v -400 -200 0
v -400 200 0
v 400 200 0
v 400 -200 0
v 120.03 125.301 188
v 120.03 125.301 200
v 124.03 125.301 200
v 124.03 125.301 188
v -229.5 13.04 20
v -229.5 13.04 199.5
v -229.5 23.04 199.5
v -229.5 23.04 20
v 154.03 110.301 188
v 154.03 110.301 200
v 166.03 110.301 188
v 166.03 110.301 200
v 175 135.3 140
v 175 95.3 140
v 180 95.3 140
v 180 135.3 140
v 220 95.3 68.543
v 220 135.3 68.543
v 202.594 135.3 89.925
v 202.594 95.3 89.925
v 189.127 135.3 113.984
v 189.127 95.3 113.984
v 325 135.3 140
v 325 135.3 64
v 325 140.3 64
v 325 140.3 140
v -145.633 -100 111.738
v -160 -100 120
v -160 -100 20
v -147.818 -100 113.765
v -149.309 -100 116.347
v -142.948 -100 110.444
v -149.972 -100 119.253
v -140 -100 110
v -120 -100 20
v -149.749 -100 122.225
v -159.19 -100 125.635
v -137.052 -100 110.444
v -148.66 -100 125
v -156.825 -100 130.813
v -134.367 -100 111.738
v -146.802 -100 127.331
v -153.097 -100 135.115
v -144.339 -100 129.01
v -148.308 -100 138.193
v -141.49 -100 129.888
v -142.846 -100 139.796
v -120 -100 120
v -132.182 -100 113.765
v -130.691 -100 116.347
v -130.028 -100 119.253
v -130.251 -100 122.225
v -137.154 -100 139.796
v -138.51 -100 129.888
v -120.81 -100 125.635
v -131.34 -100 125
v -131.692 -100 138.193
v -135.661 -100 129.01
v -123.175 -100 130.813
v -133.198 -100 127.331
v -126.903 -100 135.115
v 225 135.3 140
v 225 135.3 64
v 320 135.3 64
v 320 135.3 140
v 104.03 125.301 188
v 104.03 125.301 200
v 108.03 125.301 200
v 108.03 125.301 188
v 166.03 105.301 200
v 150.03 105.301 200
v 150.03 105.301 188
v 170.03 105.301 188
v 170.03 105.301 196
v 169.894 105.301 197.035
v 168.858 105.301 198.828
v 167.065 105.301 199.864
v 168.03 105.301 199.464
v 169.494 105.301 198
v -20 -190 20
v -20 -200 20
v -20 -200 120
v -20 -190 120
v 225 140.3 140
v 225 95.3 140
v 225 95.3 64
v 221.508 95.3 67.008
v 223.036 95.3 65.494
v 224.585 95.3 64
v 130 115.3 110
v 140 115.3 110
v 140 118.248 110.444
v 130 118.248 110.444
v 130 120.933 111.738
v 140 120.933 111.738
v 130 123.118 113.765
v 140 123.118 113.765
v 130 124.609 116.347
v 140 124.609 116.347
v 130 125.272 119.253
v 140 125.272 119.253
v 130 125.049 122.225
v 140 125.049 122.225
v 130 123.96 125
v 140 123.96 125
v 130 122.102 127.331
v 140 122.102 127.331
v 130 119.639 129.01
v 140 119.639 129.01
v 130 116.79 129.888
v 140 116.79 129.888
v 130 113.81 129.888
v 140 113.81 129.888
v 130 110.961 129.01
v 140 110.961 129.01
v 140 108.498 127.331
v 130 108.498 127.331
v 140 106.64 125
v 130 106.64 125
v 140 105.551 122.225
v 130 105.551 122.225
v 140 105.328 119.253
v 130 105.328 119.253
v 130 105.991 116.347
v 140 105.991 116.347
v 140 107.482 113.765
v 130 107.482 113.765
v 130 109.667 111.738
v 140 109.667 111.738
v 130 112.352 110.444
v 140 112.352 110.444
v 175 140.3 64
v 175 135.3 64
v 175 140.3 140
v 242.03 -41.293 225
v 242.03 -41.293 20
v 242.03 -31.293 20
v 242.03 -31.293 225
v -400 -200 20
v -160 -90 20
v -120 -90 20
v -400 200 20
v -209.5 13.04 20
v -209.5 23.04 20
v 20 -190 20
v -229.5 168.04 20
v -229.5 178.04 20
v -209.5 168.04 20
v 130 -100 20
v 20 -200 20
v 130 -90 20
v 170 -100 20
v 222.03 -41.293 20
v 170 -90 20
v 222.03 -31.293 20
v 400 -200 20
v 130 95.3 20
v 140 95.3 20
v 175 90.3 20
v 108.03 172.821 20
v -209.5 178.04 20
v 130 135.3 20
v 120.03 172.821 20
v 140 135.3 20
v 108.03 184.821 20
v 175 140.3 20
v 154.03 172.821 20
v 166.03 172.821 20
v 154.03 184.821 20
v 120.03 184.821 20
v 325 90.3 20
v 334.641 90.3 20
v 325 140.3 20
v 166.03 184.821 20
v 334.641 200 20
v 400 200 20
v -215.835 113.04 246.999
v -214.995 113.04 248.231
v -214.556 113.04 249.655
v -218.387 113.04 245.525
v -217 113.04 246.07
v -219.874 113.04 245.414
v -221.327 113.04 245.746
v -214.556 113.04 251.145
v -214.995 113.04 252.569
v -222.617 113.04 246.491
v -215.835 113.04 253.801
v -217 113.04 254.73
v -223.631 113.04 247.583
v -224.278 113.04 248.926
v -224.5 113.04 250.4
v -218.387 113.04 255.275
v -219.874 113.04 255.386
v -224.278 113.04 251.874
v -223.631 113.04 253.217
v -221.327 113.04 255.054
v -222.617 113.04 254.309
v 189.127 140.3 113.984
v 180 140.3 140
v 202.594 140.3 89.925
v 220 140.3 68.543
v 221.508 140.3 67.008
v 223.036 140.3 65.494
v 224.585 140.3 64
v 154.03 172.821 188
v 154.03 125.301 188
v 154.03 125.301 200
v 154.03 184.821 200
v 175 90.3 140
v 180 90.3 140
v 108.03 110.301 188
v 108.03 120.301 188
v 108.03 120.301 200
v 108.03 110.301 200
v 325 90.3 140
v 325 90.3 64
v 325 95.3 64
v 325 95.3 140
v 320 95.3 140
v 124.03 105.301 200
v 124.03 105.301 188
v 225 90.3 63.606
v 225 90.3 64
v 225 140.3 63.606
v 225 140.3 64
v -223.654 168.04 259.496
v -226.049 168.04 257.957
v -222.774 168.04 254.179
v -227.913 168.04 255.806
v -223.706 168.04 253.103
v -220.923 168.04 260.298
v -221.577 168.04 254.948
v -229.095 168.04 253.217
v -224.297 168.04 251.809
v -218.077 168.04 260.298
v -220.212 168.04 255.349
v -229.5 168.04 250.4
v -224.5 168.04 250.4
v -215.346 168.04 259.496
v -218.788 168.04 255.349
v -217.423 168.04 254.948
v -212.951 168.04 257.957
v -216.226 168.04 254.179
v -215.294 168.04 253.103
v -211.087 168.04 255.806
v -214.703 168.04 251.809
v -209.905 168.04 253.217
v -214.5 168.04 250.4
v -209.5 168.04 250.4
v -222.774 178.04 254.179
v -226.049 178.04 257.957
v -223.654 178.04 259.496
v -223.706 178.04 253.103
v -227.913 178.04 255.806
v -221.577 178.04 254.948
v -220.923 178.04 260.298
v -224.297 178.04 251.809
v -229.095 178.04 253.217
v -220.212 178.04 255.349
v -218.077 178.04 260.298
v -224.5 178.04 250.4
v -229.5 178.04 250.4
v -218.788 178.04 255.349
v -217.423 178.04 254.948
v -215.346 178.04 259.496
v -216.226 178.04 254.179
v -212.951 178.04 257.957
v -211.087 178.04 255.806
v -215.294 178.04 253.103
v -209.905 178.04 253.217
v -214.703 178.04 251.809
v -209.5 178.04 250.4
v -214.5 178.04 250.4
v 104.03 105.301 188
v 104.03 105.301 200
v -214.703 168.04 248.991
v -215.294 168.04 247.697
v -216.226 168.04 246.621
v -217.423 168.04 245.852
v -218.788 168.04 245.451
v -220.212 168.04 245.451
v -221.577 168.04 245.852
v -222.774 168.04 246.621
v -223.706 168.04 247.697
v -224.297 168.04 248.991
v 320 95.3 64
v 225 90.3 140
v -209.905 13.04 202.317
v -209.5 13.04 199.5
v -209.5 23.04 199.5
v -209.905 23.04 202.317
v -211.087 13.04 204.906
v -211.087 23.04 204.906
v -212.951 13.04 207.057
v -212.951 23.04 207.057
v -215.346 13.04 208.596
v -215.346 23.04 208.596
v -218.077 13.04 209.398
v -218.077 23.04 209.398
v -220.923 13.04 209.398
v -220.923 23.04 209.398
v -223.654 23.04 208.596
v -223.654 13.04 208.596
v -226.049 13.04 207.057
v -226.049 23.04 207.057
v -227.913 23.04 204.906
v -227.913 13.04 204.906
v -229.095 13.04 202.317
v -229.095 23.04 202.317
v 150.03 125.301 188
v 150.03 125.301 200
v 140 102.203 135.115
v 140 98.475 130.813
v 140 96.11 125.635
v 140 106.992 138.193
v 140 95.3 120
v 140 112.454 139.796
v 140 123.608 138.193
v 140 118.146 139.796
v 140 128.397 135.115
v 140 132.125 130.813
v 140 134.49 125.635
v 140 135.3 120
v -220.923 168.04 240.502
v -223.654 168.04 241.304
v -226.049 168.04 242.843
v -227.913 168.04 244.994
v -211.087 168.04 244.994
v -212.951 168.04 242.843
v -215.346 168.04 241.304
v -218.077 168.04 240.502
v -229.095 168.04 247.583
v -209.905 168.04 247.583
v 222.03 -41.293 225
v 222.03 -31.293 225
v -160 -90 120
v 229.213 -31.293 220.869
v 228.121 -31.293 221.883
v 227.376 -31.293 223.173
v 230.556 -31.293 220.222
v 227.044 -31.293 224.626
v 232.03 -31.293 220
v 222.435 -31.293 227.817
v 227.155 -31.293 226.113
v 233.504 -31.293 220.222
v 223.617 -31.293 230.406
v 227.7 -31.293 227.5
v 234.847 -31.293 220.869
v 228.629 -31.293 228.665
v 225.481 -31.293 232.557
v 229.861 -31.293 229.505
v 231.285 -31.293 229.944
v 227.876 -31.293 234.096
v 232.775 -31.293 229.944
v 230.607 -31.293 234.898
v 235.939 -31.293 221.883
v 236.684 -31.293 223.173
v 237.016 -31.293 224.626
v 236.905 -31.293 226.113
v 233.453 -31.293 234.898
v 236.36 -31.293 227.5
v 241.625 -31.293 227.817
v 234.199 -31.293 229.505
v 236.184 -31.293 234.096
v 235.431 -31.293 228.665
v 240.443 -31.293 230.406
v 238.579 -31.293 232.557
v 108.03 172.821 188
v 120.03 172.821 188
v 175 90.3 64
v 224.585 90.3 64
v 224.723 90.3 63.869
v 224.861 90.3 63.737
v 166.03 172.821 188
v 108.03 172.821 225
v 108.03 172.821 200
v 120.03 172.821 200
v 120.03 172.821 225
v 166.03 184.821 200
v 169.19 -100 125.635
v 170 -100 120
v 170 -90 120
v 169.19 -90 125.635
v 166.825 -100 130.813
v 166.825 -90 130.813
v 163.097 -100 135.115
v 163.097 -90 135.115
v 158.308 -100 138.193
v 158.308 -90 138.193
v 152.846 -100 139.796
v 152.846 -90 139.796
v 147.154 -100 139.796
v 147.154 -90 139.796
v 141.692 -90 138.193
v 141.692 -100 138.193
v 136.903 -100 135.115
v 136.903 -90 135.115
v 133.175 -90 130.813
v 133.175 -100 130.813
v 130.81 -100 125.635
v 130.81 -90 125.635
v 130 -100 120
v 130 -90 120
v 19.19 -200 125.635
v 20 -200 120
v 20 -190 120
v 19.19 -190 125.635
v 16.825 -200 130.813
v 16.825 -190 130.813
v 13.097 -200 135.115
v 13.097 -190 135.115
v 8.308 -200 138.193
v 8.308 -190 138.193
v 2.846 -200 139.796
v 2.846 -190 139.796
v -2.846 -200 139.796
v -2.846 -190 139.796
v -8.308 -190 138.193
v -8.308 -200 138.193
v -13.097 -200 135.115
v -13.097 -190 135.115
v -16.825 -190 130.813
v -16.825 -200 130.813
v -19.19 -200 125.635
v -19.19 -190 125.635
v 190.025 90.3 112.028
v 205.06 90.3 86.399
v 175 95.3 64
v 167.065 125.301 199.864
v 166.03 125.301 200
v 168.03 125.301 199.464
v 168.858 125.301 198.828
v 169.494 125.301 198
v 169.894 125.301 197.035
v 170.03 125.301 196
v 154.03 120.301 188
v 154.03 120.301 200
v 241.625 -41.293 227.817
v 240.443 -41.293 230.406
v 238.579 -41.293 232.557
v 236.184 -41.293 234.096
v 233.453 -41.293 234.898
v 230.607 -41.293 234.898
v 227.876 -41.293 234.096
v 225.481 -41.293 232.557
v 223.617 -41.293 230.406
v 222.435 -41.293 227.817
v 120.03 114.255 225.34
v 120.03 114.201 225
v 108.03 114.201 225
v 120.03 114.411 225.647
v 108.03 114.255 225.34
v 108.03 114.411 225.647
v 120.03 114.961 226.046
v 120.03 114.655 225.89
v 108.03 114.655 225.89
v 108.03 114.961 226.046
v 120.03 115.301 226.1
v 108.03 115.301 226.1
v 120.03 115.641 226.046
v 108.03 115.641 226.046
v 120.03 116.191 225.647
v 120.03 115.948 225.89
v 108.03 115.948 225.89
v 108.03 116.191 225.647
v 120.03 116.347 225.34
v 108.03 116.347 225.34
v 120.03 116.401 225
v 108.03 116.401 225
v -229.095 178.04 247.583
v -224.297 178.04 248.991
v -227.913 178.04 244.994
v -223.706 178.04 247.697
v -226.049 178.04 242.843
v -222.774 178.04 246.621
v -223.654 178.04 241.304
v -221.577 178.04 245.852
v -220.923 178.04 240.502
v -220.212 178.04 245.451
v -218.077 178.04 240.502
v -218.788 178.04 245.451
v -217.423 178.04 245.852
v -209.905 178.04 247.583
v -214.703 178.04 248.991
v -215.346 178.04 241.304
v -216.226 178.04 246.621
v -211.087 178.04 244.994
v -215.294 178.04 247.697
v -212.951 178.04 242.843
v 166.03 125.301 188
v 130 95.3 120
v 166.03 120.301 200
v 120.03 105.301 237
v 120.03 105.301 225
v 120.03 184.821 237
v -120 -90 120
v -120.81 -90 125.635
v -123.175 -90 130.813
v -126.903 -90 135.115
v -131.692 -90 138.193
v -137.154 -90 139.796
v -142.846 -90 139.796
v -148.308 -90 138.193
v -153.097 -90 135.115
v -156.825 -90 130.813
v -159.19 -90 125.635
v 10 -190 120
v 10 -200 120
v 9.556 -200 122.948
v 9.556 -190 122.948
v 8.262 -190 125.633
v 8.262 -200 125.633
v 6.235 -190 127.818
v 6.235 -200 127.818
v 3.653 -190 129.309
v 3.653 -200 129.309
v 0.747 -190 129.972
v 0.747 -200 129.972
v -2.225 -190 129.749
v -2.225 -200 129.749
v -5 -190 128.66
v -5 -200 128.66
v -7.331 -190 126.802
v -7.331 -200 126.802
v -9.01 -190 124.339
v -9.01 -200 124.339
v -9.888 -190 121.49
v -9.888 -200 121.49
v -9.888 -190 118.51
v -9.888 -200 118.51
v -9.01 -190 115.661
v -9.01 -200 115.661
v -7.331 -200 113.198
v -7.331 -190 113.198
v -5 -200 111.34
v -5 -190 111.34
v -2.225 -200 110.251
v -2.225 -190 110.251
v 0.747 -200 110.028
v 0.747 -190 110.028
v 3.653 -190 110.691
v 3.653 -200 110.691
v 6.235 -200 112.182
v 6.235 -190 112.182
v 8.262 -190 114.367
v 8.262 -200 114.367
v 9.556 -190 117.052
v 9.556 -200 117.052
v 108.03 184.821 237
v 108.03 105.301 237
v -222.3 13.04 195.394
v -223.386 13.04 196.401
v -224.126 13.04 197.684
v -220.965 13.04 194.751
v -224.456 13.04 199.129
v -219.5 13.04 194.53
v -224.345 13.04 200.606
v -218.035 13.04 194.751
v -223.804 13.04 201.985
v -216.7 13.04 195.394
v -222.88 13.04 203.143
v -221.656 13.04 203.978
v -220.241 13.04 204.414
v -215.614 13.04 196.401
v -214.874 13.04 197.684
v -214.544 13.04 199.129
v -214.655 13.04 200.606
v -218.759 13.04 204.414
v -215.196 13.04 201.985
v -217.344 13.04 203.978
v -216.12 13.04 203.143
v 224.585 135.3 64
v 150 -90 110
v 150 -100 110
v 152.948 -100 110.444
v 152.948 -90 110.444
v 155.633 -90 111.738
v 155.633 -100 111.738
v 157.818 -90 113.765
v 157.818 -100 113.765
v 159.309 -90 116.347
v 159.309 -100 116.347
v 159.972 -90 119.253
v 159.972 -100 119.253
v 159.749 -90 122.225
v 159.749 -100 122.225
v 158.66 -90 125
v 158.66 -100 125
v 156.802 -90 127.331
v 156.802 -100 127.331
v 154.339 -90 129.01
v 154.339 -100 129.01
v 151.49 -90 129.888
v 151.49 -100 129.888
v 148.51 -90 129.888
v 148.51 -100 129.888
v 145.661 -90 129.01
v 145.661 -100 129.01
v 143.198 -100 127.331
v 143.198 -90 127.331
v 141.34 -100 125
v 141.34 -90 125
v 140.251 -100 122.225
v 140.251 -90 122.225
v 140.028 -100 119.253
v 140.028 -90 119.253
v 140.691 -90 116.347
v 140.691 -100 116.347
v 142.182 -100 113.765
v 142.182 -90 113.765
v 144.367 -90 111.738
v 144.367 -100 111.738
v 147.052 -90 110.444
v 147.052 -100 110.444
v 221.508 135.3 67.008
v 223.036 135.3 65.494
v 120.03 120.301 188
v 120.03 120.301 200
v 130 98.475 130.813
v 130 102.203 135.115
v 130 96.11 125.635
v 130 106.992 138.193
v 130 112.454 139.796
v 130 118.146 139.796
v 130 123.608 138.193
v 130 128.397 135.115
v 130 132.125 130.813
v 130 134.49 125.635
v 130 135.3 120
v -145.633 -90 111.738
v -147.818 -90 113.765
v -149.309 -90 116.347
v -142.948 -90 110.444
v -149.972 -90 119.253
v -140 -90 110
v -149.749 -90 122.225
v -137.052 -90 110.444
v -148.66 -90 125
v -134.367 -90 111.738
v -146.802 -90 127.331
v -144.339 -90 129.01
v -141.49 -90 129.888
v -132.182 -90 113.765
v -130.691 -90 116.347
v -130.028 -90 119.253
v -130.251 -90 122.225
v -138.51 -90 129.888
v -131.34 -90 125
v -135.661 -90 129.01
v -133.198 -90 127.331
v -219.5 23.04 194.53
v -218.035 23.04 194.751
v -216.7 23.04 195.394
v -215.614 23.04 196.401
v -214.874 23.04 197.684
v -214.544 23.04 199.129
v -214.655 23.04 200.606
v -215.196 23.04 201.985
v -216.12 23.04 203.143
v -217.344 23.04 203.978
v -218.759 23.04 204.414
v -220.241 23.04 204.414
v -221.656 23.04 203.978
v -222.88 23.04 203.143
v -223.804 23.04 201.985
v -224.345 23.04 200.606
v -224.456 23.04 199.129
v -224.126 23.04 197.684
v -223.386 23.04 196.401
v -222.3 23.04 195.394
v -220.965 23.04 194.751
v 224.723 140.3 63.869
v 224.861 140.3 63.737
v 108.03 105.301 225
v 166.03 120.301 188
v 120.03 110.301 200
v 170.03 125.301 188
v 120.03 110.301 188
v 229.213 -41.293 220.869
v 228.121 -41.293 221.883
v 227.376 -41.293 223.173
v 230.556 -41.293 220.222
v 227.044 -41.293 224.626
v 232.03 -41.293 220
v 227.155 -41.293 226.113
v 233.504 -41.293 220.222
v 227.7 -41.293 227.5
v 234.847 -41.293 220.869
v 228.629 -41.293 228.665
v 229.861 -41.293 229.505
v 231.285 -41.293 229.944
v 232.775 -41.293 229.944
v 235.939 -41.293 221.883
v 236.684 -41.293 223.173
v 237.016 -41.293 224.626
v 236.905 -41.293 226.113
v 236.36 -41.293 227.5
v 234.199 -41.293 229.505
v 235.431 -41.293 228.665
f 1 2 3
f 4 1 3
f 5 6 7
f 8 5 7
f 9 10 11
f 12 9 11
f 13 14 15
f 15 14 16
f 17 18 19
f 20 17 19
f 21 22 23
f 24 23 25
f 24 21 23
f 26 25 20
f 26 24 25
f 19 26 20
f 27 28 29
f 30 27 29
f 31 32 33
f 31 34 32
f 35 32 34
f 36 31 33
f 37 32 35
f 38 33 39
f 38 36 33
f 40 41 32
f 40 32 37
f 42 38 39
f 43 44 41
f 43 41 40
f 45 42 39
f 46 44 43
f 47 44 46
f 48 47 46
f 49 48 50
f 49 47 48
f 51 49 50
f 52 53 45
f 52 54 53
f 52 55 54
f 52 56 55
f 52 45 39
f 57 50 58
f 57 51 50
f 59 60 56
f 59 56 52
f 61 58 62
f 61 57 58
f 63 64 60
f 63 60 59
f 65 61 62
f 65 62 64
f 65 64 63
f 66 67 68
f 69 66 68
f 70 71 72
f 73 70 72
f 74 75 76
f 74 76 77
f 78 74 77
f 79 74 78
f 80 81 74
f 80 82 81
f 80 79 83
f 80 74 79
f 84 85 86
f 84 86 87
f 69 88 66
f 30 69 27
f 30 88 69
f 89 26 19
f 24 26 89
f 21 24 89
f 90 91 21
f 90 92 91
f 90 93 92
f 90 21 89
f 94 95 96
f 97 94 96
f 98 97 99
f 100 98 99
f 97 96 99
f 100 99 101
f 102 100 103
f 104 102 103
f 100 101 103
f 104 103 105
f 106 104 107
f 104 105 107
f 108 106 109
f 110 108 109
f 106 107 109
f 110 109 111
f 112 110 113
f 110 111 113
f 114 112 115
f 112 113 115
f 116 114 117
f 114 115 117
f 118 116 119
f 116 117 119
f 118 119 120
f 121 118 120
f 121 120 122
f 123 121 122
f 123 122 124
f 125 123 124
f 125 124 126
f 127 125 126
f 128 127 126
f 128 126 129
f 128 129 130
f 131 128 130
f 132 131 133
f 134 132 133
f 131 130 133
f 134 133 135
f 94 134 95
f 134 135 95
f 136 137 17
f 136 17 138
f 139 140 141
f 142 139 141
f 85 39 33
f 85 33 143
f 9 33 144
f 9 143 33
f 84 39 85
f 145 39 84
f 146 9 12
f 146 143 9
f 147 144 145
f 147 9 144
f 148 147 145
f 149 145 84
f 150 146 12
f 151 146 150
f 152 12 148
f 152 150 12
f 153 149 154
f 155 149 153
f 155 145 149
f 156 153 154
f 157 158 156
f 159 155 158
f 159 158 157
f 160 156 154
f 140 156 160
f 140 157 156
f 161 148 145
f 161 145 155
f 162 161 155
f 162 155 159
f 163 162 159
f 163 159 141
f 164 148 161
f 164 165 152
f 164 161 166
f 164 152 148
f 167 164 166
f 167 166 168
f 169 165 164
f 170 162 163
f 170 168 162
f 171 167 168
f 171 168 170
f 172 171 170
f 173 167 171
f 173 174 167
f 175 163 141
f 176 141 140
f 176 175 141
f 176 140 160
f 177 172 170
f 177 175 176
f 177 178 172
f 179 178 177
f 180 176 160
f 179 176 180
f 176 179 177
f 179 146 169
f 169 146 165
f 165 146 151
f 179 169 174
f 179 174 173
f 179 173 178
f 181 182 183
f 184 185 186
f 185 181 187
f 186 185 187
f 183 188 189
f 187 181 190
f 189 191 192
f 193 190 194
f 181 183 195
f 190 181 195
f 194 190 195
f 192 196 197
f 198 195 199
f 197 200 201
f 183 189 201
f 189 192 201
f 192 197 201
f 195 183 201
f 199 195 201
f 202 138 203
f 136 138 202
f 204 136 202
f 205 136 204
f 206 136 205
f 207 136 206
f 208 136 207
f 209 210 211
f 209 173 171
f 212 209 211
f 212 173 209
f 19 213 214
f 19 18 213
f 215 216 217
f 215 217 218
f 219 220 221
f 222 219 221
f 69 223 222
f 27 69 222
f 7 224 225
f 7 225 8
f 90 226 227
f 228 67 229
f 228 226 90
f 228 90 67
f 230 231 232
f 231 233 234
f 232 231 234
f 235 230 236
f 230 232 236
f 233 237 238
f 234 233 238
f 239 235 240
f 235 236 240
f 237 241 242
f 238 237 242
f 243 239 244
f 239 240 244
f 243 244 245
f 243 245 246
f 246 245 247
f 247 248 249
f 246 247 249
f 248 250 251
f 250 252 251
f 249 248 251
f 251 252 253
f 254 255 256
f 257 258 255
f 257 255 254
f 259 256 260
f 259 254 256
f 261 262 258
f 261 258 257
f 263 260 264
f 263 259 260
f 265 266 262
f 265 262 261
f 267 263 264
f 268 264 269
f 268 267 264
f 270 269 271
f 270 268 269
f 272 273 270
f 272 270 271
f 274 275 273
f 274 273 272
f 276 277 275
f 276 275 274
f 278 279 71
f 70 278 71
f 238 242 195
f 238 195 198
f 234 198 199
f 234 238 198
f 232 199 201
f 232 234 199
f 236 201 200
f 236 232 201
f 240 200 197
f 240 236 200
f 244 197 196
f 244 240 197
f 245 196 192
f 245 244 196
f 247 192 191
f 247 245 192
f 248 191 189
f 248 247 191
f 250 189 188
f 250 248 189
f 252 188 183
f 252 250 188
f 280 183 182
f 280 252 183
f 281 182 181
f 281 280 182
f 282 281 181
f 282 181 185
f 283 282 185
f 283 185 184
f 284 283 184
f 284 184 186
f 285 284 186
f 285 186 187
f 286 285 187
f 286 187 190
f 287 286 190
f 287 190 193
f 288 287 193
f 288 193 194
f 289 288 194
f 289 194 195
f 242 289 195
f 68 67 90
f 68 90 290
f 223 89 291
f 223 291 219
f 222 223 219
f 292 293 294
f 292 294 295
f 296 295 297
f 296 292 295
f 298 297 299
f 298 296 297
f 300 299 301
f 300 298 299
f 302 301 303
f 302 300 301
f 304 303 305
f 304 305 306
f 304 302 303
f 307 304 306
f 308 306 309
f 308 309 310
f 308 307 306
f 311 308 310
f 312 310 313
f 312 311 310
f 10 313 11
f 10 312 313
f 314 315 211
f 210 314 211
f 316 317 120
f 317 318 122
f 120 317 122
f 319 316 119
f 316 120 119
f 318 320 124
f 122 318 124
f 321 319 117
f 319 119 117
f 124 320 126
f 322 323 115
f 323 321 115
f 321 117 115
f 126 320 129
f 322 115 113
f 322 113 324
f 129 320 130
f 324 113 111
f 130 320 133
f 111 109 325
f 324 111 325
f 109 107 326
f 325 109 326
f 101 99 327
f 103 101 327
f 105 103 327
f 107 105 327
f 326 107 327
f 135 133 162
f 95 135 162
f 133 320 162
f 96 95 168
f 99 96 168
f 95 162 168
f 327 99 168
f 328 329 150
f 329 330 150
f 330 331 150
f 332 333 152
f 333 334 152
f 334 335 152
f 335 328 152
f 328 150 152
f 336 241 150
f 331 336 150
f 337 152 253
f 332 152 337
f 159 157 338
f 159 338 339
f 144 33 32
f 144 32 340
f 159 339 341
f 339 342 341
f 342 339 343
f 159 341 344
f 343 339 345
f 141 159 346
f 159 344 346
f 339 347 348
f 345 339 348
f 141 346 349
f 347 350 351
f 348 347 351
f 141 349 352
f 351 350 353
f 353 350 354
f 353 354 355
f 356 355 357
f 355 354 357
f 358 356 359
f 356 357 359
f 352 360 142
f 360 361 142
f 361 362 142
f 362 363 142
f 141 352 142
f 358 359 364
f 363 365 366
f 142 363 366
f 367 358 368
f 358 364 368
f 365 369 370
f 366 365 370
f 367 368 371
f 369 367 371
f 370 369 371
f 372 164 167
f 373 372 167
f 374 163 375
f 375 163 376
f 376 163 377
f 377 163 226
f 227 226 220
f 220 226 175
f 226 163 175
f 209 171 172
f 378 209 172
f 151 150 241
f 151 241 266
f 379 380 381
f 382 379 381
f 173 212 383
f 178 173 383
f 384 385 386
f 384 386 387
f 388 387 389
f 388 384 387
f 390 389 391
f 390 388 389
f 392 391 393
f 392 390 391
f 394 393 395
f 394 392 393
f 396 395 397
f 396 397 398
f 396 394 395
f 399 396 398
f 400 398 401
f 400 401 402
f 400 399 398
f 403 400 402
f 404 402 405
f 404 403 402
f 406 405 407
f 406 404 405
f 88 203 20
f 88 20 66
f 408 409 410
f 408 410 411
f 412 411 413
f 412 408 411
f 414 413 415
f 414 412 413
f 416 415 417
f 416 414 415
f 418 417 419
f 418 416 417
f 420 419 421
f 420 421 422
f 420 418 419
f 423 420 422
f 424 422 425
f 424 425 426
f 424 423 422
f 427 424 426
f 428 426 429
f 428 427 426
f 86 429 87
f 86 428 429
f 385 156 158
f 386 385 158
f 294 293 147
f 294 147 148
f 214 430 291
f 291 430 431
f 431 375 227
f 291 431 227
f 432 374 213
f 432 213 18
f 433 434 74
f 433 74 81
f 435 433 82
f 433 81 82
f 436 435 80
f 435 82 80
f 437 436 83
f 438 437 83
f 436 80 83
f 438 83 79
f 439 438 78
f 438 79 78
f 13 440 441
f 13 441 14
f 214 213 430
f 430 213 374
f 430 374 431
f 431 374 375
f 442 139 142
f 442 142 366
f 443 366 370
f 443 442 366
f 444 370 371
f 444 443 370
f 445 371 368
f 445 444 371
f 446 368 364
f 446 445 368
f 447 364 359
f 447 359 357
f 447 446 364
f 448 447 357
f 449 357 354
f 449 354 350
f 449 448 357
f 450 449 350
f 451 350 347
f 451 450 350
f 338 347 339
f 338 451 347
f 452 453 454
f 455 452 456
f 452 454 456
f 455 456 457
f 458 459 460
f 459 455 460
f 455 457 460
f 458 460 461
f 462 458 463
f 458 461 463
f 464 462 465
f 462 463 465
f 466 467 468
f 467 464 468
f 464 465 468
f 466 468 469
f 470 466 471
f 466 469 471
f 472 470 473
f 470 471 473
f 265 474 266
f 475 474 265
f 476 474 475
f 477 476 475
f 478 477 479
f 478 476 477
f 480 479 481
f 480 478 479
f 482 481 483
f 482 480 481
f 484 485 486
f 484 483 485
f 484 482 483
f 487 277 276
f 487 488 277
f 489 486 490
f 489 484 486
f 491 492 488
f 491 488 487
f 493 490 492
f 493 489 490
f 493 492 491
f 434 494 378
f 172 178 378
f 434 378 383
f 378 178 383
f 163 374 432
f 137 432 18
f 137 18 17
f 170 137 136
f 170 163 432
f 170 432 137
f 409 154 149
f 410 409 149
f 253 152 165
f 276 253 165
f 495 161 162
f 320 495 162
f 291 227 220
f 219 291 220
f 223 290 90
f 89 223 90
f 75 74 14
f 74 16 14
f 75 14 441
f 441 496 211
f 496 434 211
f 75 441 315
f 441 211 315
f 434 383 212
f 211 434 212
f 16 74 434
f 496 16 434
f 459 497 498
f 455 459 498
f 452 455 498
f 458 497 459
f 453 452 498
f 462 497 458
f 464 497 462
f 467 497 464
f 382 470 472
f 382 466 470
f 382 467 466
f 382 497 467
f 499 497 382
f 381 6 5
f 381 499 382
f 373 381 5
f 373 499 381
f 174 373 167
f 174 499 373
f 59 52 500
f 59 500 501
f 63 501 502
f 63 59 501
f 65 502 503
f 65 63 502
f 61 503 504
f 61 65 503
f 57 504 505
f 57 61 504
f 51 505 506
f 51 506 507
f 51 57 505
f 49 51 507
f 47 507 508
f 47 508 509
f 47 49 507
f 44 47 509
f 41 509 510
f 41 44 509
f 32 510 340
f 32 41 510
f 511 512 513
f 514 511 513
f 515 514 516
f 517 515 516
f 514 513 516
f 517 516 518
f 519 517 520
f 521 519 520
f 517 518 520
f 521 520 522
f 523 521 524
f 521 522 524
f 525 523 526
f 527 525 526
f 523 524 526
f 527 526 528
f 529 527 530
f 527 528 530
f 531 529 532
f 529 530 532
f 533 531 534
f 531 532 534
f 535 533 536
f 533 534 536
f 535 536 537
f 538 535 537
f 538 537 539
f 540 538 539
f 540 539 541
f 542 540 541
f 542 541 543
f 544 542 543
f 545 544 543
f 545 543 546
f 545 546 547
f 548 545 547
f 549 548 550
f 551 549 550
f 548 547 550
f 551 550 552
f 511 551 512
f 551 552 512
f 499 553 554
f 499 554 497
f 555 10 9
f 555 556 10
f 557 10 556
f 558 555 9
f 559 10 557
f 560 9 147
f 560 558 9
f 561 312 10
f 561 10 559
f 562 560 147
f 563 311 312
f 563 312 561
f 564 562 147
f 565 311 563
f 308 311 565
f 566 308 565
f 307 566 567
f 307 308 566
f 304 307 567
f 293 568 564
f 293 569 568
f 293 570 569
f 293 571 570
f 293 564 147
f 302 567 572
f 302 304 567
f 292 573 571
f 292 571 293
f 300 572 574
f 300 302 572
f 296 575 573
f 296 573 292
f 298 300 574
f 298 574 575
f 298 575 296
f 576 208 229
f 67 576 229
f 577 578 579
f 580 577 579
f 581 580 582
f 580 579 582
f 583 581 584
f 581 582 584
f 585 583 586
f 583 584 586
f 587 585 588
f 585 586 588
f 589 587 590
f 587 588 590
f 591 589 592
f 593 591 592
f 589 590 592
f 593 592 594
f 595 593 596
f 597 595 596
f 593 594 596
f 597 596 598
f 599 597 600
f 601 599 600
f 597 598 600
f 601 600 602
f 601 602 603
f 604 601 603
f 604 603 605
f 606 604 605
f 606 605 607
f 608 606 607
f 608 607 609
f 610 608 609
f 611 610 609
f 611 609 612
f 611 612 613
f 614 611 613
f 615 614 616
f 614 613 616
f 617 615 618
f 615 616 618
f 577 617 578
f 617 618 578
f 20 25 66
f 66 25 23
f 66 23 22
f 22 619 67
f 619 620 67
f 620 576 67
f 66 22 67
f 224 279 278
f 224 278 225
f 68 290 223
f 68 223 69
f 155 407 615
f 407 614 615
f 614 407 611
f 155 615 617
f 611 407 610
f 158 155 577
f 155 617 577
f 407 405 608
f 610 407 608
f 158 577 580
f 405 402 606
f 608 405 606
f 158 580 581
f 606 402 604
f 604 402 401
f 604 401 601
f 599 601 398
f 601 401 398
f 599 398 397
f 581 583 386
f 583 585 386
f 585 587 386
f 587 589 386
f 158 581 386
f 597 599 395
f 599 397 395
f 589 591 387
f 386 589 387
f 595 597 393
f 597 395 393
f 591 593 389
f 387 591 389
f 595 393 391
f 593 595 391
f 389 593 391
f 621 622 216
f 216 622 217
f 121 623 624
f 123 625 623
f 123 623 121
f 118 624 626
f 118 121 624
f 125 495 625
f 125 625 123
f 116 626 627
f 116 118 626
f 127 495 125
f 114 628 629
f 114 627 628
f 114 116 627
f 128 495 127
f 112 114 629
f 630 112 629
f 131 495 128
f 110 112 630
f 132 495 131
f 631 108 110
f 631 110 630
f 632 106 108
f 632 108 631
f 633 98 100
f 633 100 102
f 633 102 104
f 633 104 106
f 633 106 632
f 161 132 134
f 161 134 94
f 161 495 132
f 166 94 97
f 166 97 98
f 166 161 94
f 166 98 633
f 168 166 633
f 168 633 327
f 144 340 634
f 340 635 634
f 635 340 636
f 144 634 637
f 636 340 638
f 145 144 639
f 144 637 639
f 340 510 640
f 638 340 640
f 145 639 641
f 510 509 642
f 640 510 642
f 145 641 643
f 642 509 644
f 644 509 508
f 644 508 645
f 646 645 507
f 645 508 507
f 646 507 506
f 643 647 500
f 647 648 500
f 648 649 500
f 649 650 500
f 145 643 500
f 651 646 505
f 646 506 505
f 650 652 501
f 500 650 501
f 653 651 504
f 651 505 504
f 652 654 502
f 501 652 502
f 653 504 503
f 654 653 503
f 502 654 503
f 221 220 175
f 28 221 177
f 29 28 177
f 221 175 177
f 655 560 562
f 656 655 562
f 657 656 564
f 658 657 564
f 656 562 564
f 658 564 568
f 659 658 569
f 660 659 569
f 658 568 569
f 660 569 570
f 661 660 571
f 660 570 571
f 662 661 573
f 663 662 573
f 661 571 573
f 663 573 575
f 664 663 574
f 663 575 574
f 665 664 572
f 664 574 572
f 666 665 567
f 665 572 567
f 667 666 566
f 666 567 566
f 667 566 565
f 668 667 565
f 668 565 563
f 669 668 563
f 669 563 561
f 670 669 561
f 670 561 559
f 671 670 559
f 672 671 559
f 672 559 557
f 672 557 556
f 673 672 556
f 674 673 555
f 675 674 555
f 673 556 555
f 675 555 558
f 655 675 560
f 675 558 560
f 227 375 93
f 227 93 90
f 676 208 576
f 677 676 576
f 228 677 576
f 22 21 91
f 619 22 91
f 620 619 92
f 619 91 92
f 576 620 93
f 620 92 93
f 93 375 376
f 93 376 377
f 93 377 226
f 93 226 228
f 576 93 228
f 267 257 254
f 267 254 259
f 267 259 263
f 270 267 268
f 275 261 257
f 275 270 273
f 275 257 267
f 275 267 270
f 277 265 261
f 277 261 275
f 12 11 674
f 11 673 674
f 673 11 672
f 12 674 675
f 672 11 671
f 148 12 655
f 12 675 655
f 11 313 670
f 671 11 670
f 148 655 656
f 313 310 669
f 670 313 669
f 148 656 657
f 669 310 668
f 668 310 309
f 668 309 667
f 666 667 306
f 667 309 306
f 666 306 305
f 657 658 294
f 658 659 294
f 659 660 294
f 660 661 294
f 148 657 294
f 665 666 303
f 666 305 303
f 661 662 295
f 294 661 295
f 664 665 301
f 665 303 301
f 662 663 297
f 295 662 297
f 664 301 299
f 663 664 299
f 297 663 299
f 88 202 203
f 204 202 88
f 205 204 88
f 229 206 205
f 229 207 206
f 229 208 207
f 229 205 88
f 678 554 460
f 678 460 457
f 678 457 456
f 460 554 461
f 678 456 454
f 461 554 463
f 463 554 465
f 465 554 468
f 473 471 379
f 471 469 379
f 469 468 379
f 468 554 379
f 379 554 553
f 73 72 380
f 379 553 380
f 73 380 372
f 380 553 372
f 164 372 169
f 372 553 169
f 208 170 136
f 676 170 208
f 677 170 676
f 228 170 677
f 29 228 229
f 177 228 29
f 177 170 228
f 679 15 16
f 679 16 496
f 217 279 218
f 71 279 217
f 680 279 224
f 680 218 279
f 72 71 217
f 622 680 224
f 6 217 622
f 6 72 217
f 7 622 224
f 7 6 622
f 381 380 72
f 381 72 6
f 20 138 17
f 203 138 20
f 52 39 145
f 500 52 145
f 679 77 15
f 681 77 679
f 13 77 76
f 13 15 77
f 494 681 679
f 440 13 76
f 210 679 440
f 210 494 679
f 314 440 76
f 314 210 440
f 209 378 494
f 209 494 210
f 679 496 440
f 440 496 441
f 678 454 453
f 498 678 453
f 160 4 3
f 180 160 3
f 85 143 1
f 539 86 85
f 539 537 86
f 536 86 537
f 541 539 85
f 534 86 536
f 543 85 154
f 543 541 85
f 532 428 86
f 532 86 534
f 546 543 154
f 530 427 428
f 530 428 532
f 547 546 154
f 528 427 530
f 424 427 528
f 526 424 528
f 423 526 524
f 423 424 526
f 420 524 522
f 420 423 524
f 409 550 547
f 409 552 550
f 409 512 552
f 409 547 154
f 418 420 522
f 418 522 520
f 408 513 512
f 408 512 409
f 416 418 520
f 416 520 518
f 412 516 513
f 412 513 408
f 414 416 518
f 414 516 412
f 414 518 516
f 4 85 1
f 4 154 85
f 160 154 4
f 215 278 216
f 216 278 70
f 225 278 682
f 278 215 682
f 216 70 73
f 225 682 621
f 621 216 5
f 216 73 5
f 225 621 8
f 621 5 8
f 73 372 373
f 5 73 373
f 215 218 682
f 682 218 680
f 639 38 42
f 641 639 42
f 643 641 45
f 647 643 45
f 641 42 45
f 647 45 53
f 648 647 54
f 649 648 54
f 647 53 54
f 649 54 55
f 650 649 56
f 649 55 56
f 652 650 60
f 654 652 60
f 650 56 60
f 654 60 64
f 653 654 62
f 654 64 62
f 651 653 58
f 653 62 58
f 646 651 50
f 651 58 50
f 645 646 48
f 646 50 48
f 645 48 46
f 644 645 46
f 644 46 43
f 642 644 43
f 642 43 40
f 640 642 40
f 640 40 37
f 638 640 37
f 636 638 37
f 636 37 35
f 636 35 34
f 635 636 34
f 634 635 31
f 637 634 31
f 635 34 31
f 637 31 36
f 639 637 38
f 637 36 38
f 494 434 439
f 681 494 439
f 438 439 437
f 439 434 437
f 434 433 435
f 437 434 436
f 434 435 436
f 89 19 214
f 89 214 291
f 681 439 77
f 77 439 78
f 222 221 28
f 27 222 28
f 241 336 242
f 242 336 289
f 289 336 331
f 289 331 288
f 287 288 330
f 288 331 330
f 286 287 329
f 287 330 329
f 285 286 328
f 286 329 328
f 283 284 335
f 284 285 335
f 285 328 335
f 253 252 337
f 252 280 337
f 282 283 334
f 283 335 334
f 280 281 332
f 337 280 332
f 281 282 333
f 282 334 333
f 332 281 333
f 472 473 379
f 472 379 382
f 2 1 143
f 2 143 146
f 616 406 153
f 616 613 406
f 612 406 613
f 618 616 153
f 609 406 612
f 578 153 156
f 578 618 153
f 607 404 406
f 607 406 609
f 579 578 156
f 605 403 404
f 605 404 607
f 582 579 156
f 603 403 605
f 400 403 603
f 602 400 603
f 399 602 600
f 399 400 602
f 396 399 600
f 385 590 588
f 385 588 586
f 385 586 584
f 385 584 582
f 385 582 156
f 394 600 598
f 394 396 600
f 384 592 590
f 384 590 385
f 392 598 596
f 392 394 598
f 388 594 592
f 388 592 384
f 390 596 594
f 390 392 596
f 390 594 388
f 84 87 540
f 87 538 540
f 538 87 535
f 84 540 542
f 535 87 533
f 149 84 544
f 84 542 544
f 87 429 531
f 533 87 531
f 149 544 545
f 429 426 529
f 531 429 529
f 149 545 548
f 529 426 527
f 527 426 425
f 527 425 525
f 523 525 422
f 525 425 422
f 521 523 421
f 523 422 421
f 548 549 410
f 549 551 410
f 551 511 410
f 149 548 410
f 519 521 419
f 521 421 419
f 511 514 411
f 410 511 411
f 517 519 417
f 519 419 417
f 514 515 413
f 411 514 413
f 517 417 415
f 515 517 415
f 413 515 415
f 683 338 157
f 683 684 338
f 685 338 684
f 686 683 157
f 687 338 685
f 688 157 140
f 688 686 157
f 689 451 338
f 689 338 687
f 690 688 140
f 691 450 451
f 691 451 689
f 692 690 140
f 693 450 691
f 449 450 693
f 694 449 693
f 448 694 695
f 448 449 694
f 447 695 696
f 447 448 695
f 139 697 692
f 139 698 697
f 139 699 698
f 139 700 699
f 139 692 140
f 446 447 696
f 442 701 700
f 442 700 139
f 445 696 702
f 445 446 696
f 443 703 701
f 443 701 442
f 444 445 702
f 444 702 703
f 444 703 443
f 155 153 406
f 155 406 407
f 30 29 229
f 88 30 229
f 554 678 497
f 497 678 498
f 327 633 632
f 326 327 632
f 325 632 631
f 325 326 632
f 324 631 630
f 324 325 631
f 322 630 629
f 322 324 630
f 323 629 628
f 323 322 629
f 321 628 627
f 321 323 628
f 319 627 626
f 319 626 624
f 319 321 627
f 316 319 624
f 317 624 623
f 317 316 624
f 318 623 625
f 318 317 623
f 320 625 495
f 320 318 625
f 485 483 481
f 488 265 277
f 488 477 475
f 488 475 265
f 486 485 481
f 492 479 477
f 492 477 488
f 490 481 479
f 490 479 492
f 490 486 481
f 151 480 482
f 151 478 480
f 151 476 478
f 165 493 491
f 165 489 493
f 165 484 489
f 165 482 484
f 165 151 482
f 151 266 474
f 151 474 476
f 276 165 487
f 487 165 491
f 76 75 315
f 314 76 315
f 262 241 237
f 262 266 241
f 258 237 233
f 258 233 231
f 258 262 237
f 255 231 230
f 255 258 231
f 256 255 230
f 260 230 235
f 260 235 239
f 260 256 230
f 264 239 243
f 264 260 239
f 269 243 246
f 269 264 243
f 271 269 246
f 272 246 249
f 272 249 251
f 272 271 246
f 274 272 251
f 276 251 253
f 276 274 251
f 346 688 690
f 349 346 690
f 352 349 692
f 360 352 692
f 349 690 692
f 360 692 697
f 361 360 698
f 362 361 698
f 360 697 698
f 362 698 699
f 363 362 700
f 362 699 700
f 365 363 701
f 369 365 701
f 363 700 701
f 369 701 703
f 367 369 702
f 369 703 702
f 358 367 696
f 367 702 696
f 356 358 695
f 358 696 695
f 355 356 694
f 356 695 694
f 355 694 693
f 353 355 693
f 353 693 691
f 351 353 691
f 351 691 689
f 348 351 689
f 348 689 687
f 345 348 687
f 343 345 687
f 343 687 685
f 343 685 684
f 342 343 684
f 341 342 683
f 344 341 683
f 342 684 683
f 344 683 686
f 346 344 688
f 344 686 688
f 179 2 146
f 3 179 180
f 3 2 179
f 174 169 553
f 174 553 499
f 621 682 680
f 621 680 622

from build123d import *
from build123d.topology import SkipClean

# Parameters (mm, degrees)
SKETCH_1_W           = 800
SKETCH_1_H           = 400
EXTRUDE_1_DEPTH      = 20
SKETCH_2_W           = 40
SKETCH_2_H           = 10
EXTRUDE_2_DEPTH      = 100
SKETCH_3_R           = 20
EXTRUDE_3_DEPTH      = 10
SKETCH_4_R           = 10
CUT_EXTRUDE_1_DEPTH  = 10
SKETCH_5_W           = 40
SKETCH_5_H           = 10
EXTRUDE_4_DEPTH      = 100
SKETCH_6_R           = 20
SKETCH_6_R_2         = 10
EXTRUDE_5_DEPTH      = 10
SKETCH_8_R           = 10
CUT_EXTRUDE_2_DEPTH  = 10
SKETCH_9_W           = 10
SKETCH_9_H           = 40
EXTRUDE_6_DEPTH      = 100
SKETCH_10_R          = 20
EXTRUDE_7_DEPTH      = 10
SKETCH_11_R          = 10
CUT_EXTRUDE_3_DEPTH  = 10
SKETCH_12_W          = 40
SKETCH_12_H          = 10
EXTRUDE_8_DEPTH      = 100
SKETCH_13_R          = 20
EXTRUDE_9_DEPTH      = 10
SKETCH_14_R          = 10
CUT_EXTRUDE_4_DEPTH  = 10
SKETCH_15_W          = 20
SKETCH_15_H          = 10
EXTRUDE_10_DEPTH     = 179.5
SKETCH_16_R          = 10
EXTRUDE_11_DEPTH     = 10
SKETCH_17_R          = 4.97
CUT_EXTRUDE_5_DEPTH  = 10
SKETCH_18_W          = 12
SKETCH_18_H          = 12
EXTRUDE_12_DEPTH     = 180
SKETCH_19_W          = 12
SKETCH_19_H          = 12
EXTRUDE_13_DEPTH     = 57.52
SKETCH_20_W          = 20
SKETCH_20_H          = 20
EXTRUDE_14_DEPTH     = 12
SKETCH_21_W          = 6
SKETCH_21_H          = 5
CUT_EXTRUDE_6_DEPTH  = 12
SKETCH_23_W          = 12
SKETCH_23_H          = 12
EXTRUDE_15_DEPTH     = 180
SKETCH_24_W          = 12
SKETCH_24_H          = 12
EXTRUDE_16_DEPTH     = 67.52
EXTRUDE_17_DEPTH     = 12
SKETCH_26_W          = 6
SKETCH_26_H          = 5
CUT_EXTRUDE_7_DEPTH  = 24
SKETCH_27_W          = 12
SKETCH_27_H          = 12
EXTRUDE_18_DEPTH     = 25
SKETCH_28_W          = 12
SKETCH_28_H          = 12
EXTRUDE_19_DEPTH     = 79.52
SKETCH_29_R          = 1.1
CUT_EXTRUDE_8_DEPTH  = 25
SKETCH_30_W          = 20
SKETCH_30_H          = 10
EXTRUDE_20_DEPTH     = 205
SKETCH_31_R          = 10
EXTRUDE_21_DEPTH     = 10
SKETCH_32_R          = 5
CUT_EXTRUDE_9_DEPTH  = 10
FILLET_1_R           = 4
SKETCH_34_W          = 50
SKETCH_34_H          = 50
SKETCH_34_W_2        = 40
SKETCH_34_H_2        = 40
EXTRUDE_22_DEPTH     = 120
CUT_EXTRUDE_11_DEPTH = 123
SKETCH_36_W          = 100
SKETCH_36_H          = 50
EXTRUDE_23_DEPTH     = 44
SKETCH_38_W          = 40
SKETCH_38_H          = 40
EXTRUDE_24_DEPTH     = 120
CUT_EXTRUDE_12_DEPTH = 138
SKETCH_40_W          = 50
SKETCH_40_H          = 5
EXTRUDE_26_DEPTH     = 76
SKETCH_41_W          = 5
SKETCH_41_H          = 40
EXTRUDE_27_DEPTH     = 76
SKETCH_42_W          = 20
SKETCH_42_H          = 10
EXTRUDE_28_DEPTH     = 230.4
SKETCH_43_R          = 10
EXTRUDE_29_DEPTH     = 10
SKETCH_44_R          = 5
EXTRUDE_30_DEPTH     = 65


with BuildPart() as part:
    # 草图1 → 凸台-拉伸1 (new body)
    with BuildSketch(Plane.XY):
        Rectangle(SKETCH_1_W, SKETCH_1_H)
    extrude(amount=EXTRUDE_1_DEPTH)

    # 草图2 → 凸台-拉伸2 (add)
    with BuildSketch(Plane.XY.offset(20)):
        with Locations((0, -195)):
            Rectangle(SKETCH_2_W, SKETCH_2_H)
    extrude(amount=EXTRUDE_2_DEPTH)

    # 草图3 → 凸台-拉伸3 (add)
    with BuildSketch(Plane.XZ.offset(200)):
        with Locations((0, 120)):
            Circle(SKETCH_3_R)
    extrude(amount=-EXTRUDE_3_DEPTH)

    # 草图4 → 切除-拉伸1 (cut)
    with BuildSketch(Plane.XZ.offset(200)):
        with Locations((0, 120)):
            Circle(SKETCH_4_R)
    extrude(amount=-CUT_EXTRUDE_1_DEPTH, mode=Mode.SUBTRACT)

    # 草图5 → 凸台-拉伸4 (add)
    with BuildSketch(Plane.XY.offset(20)):
        with Locations((150, -95)):
            Rectangle(SKETCH_5_W, SKETCH_5_H)
    extrude(amount=EXTRUDE_4_DEPTH)

    # 草图6 → 凸台-拉伸5 (add)
    with BuildSketch(Plane.XZ.offset(100)):
        with Locations((150, 120)):
            Circle(SKETCH_6_R)
        with Locations((150, 120)):
            Circle(SKETCH_6_R_2, mode=Mode.SUBTRACT)
    extrude(amount=-EXTRUDE_5_DEPTH)

    # 草图8 → 切除-拉伸2 (cut)
    with BuildSketch(Plane.XZ.offset(100)):
        with Locations(Location((150, 120, 0), (0, 0, 270))):
            Circle(SKETCH_8_R)
    extrude(amount=-CUT_EXTRUDE_2_DEPTH, mode=Mode.SUBTRACT)

    # 草图9 → 凸台-拉伸6 (add)
    with BuildSketch(Plane.XY.offset(20)):
        with Locations((135, 115.3)):
            Rectangle(SKETCH_9_W, SKETCH_9_H)
    extrude(amount=EXTRUDE_6_DEPTH)

    # 草图10 → 凸台-拉伸7 (add)
    with BuildSketch(Plane(origin=(140, 0, 0), x_dir=(0, 0, -1), z_dir=(1, 0, 0))):
        with Locations((-120, 115.3)):
            Circle(SKETCH_10_R)
    extrude(amount=-EXTRUDE_7_DEPTH)

    # 草图11 → 切除-拉伸3 (cut)
    with BuildSketch(Plane(origin=(140, 0, 0), x_dir=(0, 0, -1), z_dir=(1, 0, 0))):
        with Locations((-120, 115.3)):
            Circle(SKETCH_11_R)
    extrude(amount=-CUT_EXTRUDE_3_DEPTH, mode=Mode.SUBTRACT)

    # 草图12 → 凸台-拉伸8 (add)
    with BuildSketch(Plane.XY.offset(20)):
        with Locations((-140, -95)):
            Rectangle(SKETCH_12_W, SKETCH_12_H)
    extrude(amount=EXTRUDE_8_DEPTH)

    # 草图13 → 凸台-拉伸9 (add)
    with BuildSketch(Plane.XZ.offset(100)):
        with Locations((-140, 120)):
            Circle(SKETCH_13_R)
    extrude(amount=-EXTRUDE_9_DEPTH)

    # 草图14 → 切除-拉伸4 (cut)
    with BuildSketch(Plane.XZ.offset(100)):
        with Locations(Location((-140, 120, 0), (0, 0, 270))):
            Circle(SKETCH_14_R)
    extrude(amount=-CUT_EXTRUDE_4_DEPTH, mode=Mode.SUBTRACT)

    # 草图15 → 凸台-拉伸10 (add)
    with BuildSketch(Plane.XY.offset(20)):
        with Locations((-219.5, 18.039674664)):
            Rectangle(SKETCH_15_W, SKETCH_15_H)
    extrude(amount=EXTRUDE_10_DEPTH)

    # 草图16 → 凸台-拉伸11 (add)
    with BuildSketch(Plane.XZ.offset(-13.039674664)):
        with Locations((-219.5, 199.5)):
            Circle(SKETCH_16_R)
    extrude(amount=-EXTRUDE_11_DEPTH)

    # 草图17 → 切除-拉伸5 (cut)
    with BuildSketch(Plane.XZ.offset(-13.039674664)):
        with Locations(Location((-219.5, 199.5, 0), (0, 0, 270))):
            Circle(SKETCH_17_R)
    extrude(amount=-CUT_EXTRUDE_5_DEPTH, mode=Mode.SUBTRACT)

    # 草图18 → 凸台-拉伸12 (add)
    with BuildSketch(Plane.XY.offset(20)):
        with Locations((114.03, 178.821141396)):
            Rectangle(SKETCH_18_W, SKETCH_18_H)
    extrude(amount=EXTRUDE_12_DEPTH)

    # 草图19 → 凸台-拉伸13 (add)
    with BuildSketch(Plane.XZ.offset(-172.821141396)):
        with Locations((114.03, 194)):
            Rectangle(SKETCH_19_W, SKETCH_19_H)
    extrude(amount=EXTRUDE_13_DEPTH)

    # 草图20 → 凸台-拉伸14 (add)
    with BuildSketch(Plane.XY.offset(200)):
        with Locations((114.03, 115.301141396)):
            Rectangle(SKETCH_20_W, SKETCH_20_H)
    extrude(amount=-EXTRUDE_14_DEPTH)

    # 草图21 → 切除-拉伸6 (cut)
    with BuildSketch(Plane.XY.offset(200)):
        with Locations((111.03, 112.801141396)):
            Rectangle(SKETCH_21_W, SKETCH_21_H)
        Polygon((114.03, 115.301141396), (120.03, 115.301141396), (120.03, 120.301141396), (108.03, 120.301141396), (108.03, 115.301141396), align=None)
        with Locations((117.03, 112.801141396)):
            Rectangle(SKETCH_21_W, SKETCH_21_H)
    extrude(amount=-CUT_EXTRUDE_6_DEPTH, mode=Mode.SUBTRACT)

    # 草图23 → 凸台-拉伸15 (add)
    with BuildSketch(Plane.XY.offset(20)):
        with Locations((160.03, 178.821141396)):
            Rectangle(SKETCH_23_W, SKETCH_23_H)
    extrude(amount=EXTRUDE_15_DEPTH)

    # 草图24 → 凸台-拉伸16 (add)
    with BuildSketch(Plane.XZ.offset(-172.821141396)):
        with Locations((160.03, 194)):
            Rectangle(SKETCH_24_W, SKETCH_24_H)
    extrude(amount=EXTRUDE_16_DEPTH)

    # 草图25 → 凸台-拉伸17 (add)
    with BuildSketch(Plane.XY.offset(200)):
        Polygon((160.03, 105.301141396), (150.03, 105.301141396), (150.03, 125.301141396), (170.03, 125.301141396), (170.03, 105.301141396), align=None)
    extrude(amount=-EXTRUDE_17_DEPTH)

    # 草图26 → 切除-拉伸7 (cut)
    with BuildSketch(Plane.XY.offset(200)):
        Polygon((160.03, 115.301141396), (166.03, 115.301141396), (166.03, 120.301141396), (154.03, 120.301141396), (154.03, 115.301141396), align=None)
        with Locations((157.03, 112.801141396)):
            Rectangle(SKETCH_26_W, SKETCH_26_H)
        with Locations((163.03, 112.801141396)):
            Rectangle(SKETCH_26_W, SKETCH_26_H)
    extrude(amount=-CUT_EXTRUDE_7_DEPTH, mode=Mode.SUBTRACT)

    # 草图27 → 凸台-拉伸18 (add)
    with BuildSketch(Plane.XY.offset(200)):
        with Locations((114.03, 178.821141396)):
            Rectangle(SKETCH_27_W, SKETCH_27_H)
    extrude(amount=EXTRUDE_18_DEPTH)

    # 草图28 → 凸台-拉伸19 (add)
    with BuildSketch(Plane(origin=(0, 184.821141396, 0), x_dir=(1, 0, 0), z_dir=(0, 1, 0))):
        with Locations((114.03, -231)):
            Rectangle(SKETCH_28_W, SKETCH_28_H)
    extrude(amount=-EXTRUDE_19_DEPTH)

    # 草图29 → 切除-拉伸8 (cut)
    with BuildSketch(Plane.ZY.offset(-108.03)):
        with Locations((225, 115.301141396)):
            Circle(SKETCH_29_R)
    extrude(amount=-CUT_EXTRUDE_8_DEPTH, mode=Mode.SUBTRACT)

    # 草图30 → 凸台-拉伸20 (add)
    with BuildSketch(Plane.XY.offset(20)):
        with Locations((232.03, -36.293292708)):
            Rectangle(SKETCH_30_W, SKETCH_30_H)
    extrude(amount=EXTRUDE_20_DEPTH)

    # 草图31 → 凸台-拉伸21 (add)
    with BuildSketch(Plane.XZ.offset(41.293292708)):
        with Locations((232.03, 225)):
            Circle(SKETCH_31_R)
    extrude(amount=-EXTRUDE_21_DEPTH)

    # 草图32 → 切除-拉伸9 (cut)
    with BuildSketch(Plane.XZ.offset(41.293292708)):
        with Locations(Location((232.03, 225, 0), (0, 0, 270))):
            Circle(SKETCH_32_R)
    extrude(amount=-CUT_EXTRUDE_9_DEPTH, mode=Mode.SUBTRACT)

    # 圆角1
    fillet_1_edges = [part.edges().sort_by_distance(p)[0] for p in [
        (170.03, 115.301141396, 200),
    ]]
    fillet(fillet_1_edges, radius=FILLET_1_R - 0.0001)  # a hair under: the kernel refuses the full size

    # 草图34 → 凸台-拉伸22 (add)
    with BuildSketch(Plane.XY.offset(20)):
        with Locations((200, 115.3)):
            Rectangle(SKETCH_34_W, SKETCH_34_H)
        with Locations((200, 115.3)):
            Rectangle(SKETCH_34_W_2, SKETCH_34_H_2, mode=Mode.SUBTRACT)
    extrude(amount=EXTRUDE_22_DEPTH)

    # 草图35 → 切除-拉伸11 (cut)
    with BuildSketch(Plane.XZ.offset(-90.3)):
        with BuildLine():
            ThreePointArc((225, 63.606100651), (397.8155791, 33.031914681), (494.282032303, 179.641016151))
            ThreePointArc((494.282032303, 179.641016151), (314.663465241, 338.027099812), (180, 140))
            Line((180, 140), (225, 140))
            Line((225, 140), (225, 63.606100651))
        make_face()
        with BuildLine():
            Line((225, 140), (180, 140))
            ThreePointArc((180, 140), (197.090097892, 98.616335196), (225, 63.606100651))
            Line((225, 63.606100651), (225, 140))
        make_face()
    extrude(amount=-CUT_EXTRUDE_11_DEPTH, mode=Mode.SUBTRACT)

    # 草图36 → 凸台-拉伸23 (add)
    with BuildSketch(Plane.XY.offset(20)):
        with Locations((275, 115.3)):
            Rectangle(SKETCH_36_W, SKETCH_36_H)
    extrude(amount=EXTRUDE_23_DEPTH)

    # 草图38 → 凸台-拉伸24 (add)
    with BuildSketch(Plane.XY.offset(20)):
        with Locations((200, 115.3)):
            Rectangle(SKETCH_38_W, SKETCH_38_H)
    extrude(amount=EXTRUDE_24_DEPTH)

    # 草图39 → 切除-拉伸12 (cut)
    with SkipClean():  # the faces are left unmerged after this step: merging them gives an invalid solid
        with BuildSketch(Plane.XZ.offset(-95.3)):
            with BuildLine():
                Line((220, 140), (220, 68.543349868))
                ThreePointArc((220, 68.543349868), (195.340203367, 101.66321421), (180, 140))
                Line((180, 140), (220, 140))
            make_face()
        extrude(amount=-CUT_EXTRUDE_12_DEPTH, mode=Mode.SUBTRACT)

    # 草图40 → 凸台-拉伸26 (add)
    with SkipClean():  # the faces are left unmerged after this step: merging them gives an invalid solid
        with BuildSketch(Plane.XY.offset(64)):
            Polygon((325, 135.3), (325, 140.3), (320, 140.3), (225, 140.3), (225, 135.3), align=None)
            Polygon((325, 90.3), (325, 95.3), (225, 95.3), (225, 90.3), (320, 90.3), align=None)
            with Locations((200, 92.8)):
                Rectangle(SKETCH_40_W, SKETCH_40_H)
            with Locations((200, 137.8)):
                Rectangle(SKETCH_40_W, SKETCH_40_H)
        extrude(amount=EXTRUDE_26_DEPTH)

    # 草图41 → 凸台-拉伸27 (add)
    with SkipClean():  # the faces are left unmerged after this step: merging them gives an invalid solid
        with BuildSketch(Plane.XY.offset(64)):
            with Locations((322.5, 115.3)):
                Rectangle(SKETCH_41_W, SKETCH_41_H)
        extrude(amount=EXTRUDE_27_DEPTH)

    # 草图42 → 凸台-拉伸28 (add)
    with SkipClean():  # the faces are left unmerged after this step: merging them gives an invalid solid
        with BuildSketch(Plane.XY.offset(20)):
            with Locations((-219.5, 173.039674664)):
                Rectangle(SKETCH_42_W, SKETCH_42_H)
        extrude(amount=EXTRUDE_28_DEPTH)

    # 草图43 → 凸台-拉伸29 (add)
    with SkipClean():  # the faces are left unmerged after this step: merging them gives an invalid solid
        with BuildSketch(Plane(origin=(0, 178.039674664, 0), x_dir=(1, 0, 0), z_dir=(0, 1, 0))):
            with Locations((-219.5, -250.4)):
                Circle(SKETCH_43_R)
        extrude(amount=-EXTRUDE_29_DEPTH)

    # 草图44 → 凸台-拉伸30 (add)
    with SkipClean():  # the faces are left unmerged after this step: merging them gives an invalid solid
        with BuildSketch(Plane(origin=(0, 178.039674664, 0), x_dir=(1, 0, 0), z_dir=(0, 1, 0))):
            with Locations(Location((-219.5, -250.4, 0), (0, 0, 180))):
                Circle(SKETCH_44_R)
        extrude(amount=-EXTRUDE_30_DEPTH)


solid = part.part
